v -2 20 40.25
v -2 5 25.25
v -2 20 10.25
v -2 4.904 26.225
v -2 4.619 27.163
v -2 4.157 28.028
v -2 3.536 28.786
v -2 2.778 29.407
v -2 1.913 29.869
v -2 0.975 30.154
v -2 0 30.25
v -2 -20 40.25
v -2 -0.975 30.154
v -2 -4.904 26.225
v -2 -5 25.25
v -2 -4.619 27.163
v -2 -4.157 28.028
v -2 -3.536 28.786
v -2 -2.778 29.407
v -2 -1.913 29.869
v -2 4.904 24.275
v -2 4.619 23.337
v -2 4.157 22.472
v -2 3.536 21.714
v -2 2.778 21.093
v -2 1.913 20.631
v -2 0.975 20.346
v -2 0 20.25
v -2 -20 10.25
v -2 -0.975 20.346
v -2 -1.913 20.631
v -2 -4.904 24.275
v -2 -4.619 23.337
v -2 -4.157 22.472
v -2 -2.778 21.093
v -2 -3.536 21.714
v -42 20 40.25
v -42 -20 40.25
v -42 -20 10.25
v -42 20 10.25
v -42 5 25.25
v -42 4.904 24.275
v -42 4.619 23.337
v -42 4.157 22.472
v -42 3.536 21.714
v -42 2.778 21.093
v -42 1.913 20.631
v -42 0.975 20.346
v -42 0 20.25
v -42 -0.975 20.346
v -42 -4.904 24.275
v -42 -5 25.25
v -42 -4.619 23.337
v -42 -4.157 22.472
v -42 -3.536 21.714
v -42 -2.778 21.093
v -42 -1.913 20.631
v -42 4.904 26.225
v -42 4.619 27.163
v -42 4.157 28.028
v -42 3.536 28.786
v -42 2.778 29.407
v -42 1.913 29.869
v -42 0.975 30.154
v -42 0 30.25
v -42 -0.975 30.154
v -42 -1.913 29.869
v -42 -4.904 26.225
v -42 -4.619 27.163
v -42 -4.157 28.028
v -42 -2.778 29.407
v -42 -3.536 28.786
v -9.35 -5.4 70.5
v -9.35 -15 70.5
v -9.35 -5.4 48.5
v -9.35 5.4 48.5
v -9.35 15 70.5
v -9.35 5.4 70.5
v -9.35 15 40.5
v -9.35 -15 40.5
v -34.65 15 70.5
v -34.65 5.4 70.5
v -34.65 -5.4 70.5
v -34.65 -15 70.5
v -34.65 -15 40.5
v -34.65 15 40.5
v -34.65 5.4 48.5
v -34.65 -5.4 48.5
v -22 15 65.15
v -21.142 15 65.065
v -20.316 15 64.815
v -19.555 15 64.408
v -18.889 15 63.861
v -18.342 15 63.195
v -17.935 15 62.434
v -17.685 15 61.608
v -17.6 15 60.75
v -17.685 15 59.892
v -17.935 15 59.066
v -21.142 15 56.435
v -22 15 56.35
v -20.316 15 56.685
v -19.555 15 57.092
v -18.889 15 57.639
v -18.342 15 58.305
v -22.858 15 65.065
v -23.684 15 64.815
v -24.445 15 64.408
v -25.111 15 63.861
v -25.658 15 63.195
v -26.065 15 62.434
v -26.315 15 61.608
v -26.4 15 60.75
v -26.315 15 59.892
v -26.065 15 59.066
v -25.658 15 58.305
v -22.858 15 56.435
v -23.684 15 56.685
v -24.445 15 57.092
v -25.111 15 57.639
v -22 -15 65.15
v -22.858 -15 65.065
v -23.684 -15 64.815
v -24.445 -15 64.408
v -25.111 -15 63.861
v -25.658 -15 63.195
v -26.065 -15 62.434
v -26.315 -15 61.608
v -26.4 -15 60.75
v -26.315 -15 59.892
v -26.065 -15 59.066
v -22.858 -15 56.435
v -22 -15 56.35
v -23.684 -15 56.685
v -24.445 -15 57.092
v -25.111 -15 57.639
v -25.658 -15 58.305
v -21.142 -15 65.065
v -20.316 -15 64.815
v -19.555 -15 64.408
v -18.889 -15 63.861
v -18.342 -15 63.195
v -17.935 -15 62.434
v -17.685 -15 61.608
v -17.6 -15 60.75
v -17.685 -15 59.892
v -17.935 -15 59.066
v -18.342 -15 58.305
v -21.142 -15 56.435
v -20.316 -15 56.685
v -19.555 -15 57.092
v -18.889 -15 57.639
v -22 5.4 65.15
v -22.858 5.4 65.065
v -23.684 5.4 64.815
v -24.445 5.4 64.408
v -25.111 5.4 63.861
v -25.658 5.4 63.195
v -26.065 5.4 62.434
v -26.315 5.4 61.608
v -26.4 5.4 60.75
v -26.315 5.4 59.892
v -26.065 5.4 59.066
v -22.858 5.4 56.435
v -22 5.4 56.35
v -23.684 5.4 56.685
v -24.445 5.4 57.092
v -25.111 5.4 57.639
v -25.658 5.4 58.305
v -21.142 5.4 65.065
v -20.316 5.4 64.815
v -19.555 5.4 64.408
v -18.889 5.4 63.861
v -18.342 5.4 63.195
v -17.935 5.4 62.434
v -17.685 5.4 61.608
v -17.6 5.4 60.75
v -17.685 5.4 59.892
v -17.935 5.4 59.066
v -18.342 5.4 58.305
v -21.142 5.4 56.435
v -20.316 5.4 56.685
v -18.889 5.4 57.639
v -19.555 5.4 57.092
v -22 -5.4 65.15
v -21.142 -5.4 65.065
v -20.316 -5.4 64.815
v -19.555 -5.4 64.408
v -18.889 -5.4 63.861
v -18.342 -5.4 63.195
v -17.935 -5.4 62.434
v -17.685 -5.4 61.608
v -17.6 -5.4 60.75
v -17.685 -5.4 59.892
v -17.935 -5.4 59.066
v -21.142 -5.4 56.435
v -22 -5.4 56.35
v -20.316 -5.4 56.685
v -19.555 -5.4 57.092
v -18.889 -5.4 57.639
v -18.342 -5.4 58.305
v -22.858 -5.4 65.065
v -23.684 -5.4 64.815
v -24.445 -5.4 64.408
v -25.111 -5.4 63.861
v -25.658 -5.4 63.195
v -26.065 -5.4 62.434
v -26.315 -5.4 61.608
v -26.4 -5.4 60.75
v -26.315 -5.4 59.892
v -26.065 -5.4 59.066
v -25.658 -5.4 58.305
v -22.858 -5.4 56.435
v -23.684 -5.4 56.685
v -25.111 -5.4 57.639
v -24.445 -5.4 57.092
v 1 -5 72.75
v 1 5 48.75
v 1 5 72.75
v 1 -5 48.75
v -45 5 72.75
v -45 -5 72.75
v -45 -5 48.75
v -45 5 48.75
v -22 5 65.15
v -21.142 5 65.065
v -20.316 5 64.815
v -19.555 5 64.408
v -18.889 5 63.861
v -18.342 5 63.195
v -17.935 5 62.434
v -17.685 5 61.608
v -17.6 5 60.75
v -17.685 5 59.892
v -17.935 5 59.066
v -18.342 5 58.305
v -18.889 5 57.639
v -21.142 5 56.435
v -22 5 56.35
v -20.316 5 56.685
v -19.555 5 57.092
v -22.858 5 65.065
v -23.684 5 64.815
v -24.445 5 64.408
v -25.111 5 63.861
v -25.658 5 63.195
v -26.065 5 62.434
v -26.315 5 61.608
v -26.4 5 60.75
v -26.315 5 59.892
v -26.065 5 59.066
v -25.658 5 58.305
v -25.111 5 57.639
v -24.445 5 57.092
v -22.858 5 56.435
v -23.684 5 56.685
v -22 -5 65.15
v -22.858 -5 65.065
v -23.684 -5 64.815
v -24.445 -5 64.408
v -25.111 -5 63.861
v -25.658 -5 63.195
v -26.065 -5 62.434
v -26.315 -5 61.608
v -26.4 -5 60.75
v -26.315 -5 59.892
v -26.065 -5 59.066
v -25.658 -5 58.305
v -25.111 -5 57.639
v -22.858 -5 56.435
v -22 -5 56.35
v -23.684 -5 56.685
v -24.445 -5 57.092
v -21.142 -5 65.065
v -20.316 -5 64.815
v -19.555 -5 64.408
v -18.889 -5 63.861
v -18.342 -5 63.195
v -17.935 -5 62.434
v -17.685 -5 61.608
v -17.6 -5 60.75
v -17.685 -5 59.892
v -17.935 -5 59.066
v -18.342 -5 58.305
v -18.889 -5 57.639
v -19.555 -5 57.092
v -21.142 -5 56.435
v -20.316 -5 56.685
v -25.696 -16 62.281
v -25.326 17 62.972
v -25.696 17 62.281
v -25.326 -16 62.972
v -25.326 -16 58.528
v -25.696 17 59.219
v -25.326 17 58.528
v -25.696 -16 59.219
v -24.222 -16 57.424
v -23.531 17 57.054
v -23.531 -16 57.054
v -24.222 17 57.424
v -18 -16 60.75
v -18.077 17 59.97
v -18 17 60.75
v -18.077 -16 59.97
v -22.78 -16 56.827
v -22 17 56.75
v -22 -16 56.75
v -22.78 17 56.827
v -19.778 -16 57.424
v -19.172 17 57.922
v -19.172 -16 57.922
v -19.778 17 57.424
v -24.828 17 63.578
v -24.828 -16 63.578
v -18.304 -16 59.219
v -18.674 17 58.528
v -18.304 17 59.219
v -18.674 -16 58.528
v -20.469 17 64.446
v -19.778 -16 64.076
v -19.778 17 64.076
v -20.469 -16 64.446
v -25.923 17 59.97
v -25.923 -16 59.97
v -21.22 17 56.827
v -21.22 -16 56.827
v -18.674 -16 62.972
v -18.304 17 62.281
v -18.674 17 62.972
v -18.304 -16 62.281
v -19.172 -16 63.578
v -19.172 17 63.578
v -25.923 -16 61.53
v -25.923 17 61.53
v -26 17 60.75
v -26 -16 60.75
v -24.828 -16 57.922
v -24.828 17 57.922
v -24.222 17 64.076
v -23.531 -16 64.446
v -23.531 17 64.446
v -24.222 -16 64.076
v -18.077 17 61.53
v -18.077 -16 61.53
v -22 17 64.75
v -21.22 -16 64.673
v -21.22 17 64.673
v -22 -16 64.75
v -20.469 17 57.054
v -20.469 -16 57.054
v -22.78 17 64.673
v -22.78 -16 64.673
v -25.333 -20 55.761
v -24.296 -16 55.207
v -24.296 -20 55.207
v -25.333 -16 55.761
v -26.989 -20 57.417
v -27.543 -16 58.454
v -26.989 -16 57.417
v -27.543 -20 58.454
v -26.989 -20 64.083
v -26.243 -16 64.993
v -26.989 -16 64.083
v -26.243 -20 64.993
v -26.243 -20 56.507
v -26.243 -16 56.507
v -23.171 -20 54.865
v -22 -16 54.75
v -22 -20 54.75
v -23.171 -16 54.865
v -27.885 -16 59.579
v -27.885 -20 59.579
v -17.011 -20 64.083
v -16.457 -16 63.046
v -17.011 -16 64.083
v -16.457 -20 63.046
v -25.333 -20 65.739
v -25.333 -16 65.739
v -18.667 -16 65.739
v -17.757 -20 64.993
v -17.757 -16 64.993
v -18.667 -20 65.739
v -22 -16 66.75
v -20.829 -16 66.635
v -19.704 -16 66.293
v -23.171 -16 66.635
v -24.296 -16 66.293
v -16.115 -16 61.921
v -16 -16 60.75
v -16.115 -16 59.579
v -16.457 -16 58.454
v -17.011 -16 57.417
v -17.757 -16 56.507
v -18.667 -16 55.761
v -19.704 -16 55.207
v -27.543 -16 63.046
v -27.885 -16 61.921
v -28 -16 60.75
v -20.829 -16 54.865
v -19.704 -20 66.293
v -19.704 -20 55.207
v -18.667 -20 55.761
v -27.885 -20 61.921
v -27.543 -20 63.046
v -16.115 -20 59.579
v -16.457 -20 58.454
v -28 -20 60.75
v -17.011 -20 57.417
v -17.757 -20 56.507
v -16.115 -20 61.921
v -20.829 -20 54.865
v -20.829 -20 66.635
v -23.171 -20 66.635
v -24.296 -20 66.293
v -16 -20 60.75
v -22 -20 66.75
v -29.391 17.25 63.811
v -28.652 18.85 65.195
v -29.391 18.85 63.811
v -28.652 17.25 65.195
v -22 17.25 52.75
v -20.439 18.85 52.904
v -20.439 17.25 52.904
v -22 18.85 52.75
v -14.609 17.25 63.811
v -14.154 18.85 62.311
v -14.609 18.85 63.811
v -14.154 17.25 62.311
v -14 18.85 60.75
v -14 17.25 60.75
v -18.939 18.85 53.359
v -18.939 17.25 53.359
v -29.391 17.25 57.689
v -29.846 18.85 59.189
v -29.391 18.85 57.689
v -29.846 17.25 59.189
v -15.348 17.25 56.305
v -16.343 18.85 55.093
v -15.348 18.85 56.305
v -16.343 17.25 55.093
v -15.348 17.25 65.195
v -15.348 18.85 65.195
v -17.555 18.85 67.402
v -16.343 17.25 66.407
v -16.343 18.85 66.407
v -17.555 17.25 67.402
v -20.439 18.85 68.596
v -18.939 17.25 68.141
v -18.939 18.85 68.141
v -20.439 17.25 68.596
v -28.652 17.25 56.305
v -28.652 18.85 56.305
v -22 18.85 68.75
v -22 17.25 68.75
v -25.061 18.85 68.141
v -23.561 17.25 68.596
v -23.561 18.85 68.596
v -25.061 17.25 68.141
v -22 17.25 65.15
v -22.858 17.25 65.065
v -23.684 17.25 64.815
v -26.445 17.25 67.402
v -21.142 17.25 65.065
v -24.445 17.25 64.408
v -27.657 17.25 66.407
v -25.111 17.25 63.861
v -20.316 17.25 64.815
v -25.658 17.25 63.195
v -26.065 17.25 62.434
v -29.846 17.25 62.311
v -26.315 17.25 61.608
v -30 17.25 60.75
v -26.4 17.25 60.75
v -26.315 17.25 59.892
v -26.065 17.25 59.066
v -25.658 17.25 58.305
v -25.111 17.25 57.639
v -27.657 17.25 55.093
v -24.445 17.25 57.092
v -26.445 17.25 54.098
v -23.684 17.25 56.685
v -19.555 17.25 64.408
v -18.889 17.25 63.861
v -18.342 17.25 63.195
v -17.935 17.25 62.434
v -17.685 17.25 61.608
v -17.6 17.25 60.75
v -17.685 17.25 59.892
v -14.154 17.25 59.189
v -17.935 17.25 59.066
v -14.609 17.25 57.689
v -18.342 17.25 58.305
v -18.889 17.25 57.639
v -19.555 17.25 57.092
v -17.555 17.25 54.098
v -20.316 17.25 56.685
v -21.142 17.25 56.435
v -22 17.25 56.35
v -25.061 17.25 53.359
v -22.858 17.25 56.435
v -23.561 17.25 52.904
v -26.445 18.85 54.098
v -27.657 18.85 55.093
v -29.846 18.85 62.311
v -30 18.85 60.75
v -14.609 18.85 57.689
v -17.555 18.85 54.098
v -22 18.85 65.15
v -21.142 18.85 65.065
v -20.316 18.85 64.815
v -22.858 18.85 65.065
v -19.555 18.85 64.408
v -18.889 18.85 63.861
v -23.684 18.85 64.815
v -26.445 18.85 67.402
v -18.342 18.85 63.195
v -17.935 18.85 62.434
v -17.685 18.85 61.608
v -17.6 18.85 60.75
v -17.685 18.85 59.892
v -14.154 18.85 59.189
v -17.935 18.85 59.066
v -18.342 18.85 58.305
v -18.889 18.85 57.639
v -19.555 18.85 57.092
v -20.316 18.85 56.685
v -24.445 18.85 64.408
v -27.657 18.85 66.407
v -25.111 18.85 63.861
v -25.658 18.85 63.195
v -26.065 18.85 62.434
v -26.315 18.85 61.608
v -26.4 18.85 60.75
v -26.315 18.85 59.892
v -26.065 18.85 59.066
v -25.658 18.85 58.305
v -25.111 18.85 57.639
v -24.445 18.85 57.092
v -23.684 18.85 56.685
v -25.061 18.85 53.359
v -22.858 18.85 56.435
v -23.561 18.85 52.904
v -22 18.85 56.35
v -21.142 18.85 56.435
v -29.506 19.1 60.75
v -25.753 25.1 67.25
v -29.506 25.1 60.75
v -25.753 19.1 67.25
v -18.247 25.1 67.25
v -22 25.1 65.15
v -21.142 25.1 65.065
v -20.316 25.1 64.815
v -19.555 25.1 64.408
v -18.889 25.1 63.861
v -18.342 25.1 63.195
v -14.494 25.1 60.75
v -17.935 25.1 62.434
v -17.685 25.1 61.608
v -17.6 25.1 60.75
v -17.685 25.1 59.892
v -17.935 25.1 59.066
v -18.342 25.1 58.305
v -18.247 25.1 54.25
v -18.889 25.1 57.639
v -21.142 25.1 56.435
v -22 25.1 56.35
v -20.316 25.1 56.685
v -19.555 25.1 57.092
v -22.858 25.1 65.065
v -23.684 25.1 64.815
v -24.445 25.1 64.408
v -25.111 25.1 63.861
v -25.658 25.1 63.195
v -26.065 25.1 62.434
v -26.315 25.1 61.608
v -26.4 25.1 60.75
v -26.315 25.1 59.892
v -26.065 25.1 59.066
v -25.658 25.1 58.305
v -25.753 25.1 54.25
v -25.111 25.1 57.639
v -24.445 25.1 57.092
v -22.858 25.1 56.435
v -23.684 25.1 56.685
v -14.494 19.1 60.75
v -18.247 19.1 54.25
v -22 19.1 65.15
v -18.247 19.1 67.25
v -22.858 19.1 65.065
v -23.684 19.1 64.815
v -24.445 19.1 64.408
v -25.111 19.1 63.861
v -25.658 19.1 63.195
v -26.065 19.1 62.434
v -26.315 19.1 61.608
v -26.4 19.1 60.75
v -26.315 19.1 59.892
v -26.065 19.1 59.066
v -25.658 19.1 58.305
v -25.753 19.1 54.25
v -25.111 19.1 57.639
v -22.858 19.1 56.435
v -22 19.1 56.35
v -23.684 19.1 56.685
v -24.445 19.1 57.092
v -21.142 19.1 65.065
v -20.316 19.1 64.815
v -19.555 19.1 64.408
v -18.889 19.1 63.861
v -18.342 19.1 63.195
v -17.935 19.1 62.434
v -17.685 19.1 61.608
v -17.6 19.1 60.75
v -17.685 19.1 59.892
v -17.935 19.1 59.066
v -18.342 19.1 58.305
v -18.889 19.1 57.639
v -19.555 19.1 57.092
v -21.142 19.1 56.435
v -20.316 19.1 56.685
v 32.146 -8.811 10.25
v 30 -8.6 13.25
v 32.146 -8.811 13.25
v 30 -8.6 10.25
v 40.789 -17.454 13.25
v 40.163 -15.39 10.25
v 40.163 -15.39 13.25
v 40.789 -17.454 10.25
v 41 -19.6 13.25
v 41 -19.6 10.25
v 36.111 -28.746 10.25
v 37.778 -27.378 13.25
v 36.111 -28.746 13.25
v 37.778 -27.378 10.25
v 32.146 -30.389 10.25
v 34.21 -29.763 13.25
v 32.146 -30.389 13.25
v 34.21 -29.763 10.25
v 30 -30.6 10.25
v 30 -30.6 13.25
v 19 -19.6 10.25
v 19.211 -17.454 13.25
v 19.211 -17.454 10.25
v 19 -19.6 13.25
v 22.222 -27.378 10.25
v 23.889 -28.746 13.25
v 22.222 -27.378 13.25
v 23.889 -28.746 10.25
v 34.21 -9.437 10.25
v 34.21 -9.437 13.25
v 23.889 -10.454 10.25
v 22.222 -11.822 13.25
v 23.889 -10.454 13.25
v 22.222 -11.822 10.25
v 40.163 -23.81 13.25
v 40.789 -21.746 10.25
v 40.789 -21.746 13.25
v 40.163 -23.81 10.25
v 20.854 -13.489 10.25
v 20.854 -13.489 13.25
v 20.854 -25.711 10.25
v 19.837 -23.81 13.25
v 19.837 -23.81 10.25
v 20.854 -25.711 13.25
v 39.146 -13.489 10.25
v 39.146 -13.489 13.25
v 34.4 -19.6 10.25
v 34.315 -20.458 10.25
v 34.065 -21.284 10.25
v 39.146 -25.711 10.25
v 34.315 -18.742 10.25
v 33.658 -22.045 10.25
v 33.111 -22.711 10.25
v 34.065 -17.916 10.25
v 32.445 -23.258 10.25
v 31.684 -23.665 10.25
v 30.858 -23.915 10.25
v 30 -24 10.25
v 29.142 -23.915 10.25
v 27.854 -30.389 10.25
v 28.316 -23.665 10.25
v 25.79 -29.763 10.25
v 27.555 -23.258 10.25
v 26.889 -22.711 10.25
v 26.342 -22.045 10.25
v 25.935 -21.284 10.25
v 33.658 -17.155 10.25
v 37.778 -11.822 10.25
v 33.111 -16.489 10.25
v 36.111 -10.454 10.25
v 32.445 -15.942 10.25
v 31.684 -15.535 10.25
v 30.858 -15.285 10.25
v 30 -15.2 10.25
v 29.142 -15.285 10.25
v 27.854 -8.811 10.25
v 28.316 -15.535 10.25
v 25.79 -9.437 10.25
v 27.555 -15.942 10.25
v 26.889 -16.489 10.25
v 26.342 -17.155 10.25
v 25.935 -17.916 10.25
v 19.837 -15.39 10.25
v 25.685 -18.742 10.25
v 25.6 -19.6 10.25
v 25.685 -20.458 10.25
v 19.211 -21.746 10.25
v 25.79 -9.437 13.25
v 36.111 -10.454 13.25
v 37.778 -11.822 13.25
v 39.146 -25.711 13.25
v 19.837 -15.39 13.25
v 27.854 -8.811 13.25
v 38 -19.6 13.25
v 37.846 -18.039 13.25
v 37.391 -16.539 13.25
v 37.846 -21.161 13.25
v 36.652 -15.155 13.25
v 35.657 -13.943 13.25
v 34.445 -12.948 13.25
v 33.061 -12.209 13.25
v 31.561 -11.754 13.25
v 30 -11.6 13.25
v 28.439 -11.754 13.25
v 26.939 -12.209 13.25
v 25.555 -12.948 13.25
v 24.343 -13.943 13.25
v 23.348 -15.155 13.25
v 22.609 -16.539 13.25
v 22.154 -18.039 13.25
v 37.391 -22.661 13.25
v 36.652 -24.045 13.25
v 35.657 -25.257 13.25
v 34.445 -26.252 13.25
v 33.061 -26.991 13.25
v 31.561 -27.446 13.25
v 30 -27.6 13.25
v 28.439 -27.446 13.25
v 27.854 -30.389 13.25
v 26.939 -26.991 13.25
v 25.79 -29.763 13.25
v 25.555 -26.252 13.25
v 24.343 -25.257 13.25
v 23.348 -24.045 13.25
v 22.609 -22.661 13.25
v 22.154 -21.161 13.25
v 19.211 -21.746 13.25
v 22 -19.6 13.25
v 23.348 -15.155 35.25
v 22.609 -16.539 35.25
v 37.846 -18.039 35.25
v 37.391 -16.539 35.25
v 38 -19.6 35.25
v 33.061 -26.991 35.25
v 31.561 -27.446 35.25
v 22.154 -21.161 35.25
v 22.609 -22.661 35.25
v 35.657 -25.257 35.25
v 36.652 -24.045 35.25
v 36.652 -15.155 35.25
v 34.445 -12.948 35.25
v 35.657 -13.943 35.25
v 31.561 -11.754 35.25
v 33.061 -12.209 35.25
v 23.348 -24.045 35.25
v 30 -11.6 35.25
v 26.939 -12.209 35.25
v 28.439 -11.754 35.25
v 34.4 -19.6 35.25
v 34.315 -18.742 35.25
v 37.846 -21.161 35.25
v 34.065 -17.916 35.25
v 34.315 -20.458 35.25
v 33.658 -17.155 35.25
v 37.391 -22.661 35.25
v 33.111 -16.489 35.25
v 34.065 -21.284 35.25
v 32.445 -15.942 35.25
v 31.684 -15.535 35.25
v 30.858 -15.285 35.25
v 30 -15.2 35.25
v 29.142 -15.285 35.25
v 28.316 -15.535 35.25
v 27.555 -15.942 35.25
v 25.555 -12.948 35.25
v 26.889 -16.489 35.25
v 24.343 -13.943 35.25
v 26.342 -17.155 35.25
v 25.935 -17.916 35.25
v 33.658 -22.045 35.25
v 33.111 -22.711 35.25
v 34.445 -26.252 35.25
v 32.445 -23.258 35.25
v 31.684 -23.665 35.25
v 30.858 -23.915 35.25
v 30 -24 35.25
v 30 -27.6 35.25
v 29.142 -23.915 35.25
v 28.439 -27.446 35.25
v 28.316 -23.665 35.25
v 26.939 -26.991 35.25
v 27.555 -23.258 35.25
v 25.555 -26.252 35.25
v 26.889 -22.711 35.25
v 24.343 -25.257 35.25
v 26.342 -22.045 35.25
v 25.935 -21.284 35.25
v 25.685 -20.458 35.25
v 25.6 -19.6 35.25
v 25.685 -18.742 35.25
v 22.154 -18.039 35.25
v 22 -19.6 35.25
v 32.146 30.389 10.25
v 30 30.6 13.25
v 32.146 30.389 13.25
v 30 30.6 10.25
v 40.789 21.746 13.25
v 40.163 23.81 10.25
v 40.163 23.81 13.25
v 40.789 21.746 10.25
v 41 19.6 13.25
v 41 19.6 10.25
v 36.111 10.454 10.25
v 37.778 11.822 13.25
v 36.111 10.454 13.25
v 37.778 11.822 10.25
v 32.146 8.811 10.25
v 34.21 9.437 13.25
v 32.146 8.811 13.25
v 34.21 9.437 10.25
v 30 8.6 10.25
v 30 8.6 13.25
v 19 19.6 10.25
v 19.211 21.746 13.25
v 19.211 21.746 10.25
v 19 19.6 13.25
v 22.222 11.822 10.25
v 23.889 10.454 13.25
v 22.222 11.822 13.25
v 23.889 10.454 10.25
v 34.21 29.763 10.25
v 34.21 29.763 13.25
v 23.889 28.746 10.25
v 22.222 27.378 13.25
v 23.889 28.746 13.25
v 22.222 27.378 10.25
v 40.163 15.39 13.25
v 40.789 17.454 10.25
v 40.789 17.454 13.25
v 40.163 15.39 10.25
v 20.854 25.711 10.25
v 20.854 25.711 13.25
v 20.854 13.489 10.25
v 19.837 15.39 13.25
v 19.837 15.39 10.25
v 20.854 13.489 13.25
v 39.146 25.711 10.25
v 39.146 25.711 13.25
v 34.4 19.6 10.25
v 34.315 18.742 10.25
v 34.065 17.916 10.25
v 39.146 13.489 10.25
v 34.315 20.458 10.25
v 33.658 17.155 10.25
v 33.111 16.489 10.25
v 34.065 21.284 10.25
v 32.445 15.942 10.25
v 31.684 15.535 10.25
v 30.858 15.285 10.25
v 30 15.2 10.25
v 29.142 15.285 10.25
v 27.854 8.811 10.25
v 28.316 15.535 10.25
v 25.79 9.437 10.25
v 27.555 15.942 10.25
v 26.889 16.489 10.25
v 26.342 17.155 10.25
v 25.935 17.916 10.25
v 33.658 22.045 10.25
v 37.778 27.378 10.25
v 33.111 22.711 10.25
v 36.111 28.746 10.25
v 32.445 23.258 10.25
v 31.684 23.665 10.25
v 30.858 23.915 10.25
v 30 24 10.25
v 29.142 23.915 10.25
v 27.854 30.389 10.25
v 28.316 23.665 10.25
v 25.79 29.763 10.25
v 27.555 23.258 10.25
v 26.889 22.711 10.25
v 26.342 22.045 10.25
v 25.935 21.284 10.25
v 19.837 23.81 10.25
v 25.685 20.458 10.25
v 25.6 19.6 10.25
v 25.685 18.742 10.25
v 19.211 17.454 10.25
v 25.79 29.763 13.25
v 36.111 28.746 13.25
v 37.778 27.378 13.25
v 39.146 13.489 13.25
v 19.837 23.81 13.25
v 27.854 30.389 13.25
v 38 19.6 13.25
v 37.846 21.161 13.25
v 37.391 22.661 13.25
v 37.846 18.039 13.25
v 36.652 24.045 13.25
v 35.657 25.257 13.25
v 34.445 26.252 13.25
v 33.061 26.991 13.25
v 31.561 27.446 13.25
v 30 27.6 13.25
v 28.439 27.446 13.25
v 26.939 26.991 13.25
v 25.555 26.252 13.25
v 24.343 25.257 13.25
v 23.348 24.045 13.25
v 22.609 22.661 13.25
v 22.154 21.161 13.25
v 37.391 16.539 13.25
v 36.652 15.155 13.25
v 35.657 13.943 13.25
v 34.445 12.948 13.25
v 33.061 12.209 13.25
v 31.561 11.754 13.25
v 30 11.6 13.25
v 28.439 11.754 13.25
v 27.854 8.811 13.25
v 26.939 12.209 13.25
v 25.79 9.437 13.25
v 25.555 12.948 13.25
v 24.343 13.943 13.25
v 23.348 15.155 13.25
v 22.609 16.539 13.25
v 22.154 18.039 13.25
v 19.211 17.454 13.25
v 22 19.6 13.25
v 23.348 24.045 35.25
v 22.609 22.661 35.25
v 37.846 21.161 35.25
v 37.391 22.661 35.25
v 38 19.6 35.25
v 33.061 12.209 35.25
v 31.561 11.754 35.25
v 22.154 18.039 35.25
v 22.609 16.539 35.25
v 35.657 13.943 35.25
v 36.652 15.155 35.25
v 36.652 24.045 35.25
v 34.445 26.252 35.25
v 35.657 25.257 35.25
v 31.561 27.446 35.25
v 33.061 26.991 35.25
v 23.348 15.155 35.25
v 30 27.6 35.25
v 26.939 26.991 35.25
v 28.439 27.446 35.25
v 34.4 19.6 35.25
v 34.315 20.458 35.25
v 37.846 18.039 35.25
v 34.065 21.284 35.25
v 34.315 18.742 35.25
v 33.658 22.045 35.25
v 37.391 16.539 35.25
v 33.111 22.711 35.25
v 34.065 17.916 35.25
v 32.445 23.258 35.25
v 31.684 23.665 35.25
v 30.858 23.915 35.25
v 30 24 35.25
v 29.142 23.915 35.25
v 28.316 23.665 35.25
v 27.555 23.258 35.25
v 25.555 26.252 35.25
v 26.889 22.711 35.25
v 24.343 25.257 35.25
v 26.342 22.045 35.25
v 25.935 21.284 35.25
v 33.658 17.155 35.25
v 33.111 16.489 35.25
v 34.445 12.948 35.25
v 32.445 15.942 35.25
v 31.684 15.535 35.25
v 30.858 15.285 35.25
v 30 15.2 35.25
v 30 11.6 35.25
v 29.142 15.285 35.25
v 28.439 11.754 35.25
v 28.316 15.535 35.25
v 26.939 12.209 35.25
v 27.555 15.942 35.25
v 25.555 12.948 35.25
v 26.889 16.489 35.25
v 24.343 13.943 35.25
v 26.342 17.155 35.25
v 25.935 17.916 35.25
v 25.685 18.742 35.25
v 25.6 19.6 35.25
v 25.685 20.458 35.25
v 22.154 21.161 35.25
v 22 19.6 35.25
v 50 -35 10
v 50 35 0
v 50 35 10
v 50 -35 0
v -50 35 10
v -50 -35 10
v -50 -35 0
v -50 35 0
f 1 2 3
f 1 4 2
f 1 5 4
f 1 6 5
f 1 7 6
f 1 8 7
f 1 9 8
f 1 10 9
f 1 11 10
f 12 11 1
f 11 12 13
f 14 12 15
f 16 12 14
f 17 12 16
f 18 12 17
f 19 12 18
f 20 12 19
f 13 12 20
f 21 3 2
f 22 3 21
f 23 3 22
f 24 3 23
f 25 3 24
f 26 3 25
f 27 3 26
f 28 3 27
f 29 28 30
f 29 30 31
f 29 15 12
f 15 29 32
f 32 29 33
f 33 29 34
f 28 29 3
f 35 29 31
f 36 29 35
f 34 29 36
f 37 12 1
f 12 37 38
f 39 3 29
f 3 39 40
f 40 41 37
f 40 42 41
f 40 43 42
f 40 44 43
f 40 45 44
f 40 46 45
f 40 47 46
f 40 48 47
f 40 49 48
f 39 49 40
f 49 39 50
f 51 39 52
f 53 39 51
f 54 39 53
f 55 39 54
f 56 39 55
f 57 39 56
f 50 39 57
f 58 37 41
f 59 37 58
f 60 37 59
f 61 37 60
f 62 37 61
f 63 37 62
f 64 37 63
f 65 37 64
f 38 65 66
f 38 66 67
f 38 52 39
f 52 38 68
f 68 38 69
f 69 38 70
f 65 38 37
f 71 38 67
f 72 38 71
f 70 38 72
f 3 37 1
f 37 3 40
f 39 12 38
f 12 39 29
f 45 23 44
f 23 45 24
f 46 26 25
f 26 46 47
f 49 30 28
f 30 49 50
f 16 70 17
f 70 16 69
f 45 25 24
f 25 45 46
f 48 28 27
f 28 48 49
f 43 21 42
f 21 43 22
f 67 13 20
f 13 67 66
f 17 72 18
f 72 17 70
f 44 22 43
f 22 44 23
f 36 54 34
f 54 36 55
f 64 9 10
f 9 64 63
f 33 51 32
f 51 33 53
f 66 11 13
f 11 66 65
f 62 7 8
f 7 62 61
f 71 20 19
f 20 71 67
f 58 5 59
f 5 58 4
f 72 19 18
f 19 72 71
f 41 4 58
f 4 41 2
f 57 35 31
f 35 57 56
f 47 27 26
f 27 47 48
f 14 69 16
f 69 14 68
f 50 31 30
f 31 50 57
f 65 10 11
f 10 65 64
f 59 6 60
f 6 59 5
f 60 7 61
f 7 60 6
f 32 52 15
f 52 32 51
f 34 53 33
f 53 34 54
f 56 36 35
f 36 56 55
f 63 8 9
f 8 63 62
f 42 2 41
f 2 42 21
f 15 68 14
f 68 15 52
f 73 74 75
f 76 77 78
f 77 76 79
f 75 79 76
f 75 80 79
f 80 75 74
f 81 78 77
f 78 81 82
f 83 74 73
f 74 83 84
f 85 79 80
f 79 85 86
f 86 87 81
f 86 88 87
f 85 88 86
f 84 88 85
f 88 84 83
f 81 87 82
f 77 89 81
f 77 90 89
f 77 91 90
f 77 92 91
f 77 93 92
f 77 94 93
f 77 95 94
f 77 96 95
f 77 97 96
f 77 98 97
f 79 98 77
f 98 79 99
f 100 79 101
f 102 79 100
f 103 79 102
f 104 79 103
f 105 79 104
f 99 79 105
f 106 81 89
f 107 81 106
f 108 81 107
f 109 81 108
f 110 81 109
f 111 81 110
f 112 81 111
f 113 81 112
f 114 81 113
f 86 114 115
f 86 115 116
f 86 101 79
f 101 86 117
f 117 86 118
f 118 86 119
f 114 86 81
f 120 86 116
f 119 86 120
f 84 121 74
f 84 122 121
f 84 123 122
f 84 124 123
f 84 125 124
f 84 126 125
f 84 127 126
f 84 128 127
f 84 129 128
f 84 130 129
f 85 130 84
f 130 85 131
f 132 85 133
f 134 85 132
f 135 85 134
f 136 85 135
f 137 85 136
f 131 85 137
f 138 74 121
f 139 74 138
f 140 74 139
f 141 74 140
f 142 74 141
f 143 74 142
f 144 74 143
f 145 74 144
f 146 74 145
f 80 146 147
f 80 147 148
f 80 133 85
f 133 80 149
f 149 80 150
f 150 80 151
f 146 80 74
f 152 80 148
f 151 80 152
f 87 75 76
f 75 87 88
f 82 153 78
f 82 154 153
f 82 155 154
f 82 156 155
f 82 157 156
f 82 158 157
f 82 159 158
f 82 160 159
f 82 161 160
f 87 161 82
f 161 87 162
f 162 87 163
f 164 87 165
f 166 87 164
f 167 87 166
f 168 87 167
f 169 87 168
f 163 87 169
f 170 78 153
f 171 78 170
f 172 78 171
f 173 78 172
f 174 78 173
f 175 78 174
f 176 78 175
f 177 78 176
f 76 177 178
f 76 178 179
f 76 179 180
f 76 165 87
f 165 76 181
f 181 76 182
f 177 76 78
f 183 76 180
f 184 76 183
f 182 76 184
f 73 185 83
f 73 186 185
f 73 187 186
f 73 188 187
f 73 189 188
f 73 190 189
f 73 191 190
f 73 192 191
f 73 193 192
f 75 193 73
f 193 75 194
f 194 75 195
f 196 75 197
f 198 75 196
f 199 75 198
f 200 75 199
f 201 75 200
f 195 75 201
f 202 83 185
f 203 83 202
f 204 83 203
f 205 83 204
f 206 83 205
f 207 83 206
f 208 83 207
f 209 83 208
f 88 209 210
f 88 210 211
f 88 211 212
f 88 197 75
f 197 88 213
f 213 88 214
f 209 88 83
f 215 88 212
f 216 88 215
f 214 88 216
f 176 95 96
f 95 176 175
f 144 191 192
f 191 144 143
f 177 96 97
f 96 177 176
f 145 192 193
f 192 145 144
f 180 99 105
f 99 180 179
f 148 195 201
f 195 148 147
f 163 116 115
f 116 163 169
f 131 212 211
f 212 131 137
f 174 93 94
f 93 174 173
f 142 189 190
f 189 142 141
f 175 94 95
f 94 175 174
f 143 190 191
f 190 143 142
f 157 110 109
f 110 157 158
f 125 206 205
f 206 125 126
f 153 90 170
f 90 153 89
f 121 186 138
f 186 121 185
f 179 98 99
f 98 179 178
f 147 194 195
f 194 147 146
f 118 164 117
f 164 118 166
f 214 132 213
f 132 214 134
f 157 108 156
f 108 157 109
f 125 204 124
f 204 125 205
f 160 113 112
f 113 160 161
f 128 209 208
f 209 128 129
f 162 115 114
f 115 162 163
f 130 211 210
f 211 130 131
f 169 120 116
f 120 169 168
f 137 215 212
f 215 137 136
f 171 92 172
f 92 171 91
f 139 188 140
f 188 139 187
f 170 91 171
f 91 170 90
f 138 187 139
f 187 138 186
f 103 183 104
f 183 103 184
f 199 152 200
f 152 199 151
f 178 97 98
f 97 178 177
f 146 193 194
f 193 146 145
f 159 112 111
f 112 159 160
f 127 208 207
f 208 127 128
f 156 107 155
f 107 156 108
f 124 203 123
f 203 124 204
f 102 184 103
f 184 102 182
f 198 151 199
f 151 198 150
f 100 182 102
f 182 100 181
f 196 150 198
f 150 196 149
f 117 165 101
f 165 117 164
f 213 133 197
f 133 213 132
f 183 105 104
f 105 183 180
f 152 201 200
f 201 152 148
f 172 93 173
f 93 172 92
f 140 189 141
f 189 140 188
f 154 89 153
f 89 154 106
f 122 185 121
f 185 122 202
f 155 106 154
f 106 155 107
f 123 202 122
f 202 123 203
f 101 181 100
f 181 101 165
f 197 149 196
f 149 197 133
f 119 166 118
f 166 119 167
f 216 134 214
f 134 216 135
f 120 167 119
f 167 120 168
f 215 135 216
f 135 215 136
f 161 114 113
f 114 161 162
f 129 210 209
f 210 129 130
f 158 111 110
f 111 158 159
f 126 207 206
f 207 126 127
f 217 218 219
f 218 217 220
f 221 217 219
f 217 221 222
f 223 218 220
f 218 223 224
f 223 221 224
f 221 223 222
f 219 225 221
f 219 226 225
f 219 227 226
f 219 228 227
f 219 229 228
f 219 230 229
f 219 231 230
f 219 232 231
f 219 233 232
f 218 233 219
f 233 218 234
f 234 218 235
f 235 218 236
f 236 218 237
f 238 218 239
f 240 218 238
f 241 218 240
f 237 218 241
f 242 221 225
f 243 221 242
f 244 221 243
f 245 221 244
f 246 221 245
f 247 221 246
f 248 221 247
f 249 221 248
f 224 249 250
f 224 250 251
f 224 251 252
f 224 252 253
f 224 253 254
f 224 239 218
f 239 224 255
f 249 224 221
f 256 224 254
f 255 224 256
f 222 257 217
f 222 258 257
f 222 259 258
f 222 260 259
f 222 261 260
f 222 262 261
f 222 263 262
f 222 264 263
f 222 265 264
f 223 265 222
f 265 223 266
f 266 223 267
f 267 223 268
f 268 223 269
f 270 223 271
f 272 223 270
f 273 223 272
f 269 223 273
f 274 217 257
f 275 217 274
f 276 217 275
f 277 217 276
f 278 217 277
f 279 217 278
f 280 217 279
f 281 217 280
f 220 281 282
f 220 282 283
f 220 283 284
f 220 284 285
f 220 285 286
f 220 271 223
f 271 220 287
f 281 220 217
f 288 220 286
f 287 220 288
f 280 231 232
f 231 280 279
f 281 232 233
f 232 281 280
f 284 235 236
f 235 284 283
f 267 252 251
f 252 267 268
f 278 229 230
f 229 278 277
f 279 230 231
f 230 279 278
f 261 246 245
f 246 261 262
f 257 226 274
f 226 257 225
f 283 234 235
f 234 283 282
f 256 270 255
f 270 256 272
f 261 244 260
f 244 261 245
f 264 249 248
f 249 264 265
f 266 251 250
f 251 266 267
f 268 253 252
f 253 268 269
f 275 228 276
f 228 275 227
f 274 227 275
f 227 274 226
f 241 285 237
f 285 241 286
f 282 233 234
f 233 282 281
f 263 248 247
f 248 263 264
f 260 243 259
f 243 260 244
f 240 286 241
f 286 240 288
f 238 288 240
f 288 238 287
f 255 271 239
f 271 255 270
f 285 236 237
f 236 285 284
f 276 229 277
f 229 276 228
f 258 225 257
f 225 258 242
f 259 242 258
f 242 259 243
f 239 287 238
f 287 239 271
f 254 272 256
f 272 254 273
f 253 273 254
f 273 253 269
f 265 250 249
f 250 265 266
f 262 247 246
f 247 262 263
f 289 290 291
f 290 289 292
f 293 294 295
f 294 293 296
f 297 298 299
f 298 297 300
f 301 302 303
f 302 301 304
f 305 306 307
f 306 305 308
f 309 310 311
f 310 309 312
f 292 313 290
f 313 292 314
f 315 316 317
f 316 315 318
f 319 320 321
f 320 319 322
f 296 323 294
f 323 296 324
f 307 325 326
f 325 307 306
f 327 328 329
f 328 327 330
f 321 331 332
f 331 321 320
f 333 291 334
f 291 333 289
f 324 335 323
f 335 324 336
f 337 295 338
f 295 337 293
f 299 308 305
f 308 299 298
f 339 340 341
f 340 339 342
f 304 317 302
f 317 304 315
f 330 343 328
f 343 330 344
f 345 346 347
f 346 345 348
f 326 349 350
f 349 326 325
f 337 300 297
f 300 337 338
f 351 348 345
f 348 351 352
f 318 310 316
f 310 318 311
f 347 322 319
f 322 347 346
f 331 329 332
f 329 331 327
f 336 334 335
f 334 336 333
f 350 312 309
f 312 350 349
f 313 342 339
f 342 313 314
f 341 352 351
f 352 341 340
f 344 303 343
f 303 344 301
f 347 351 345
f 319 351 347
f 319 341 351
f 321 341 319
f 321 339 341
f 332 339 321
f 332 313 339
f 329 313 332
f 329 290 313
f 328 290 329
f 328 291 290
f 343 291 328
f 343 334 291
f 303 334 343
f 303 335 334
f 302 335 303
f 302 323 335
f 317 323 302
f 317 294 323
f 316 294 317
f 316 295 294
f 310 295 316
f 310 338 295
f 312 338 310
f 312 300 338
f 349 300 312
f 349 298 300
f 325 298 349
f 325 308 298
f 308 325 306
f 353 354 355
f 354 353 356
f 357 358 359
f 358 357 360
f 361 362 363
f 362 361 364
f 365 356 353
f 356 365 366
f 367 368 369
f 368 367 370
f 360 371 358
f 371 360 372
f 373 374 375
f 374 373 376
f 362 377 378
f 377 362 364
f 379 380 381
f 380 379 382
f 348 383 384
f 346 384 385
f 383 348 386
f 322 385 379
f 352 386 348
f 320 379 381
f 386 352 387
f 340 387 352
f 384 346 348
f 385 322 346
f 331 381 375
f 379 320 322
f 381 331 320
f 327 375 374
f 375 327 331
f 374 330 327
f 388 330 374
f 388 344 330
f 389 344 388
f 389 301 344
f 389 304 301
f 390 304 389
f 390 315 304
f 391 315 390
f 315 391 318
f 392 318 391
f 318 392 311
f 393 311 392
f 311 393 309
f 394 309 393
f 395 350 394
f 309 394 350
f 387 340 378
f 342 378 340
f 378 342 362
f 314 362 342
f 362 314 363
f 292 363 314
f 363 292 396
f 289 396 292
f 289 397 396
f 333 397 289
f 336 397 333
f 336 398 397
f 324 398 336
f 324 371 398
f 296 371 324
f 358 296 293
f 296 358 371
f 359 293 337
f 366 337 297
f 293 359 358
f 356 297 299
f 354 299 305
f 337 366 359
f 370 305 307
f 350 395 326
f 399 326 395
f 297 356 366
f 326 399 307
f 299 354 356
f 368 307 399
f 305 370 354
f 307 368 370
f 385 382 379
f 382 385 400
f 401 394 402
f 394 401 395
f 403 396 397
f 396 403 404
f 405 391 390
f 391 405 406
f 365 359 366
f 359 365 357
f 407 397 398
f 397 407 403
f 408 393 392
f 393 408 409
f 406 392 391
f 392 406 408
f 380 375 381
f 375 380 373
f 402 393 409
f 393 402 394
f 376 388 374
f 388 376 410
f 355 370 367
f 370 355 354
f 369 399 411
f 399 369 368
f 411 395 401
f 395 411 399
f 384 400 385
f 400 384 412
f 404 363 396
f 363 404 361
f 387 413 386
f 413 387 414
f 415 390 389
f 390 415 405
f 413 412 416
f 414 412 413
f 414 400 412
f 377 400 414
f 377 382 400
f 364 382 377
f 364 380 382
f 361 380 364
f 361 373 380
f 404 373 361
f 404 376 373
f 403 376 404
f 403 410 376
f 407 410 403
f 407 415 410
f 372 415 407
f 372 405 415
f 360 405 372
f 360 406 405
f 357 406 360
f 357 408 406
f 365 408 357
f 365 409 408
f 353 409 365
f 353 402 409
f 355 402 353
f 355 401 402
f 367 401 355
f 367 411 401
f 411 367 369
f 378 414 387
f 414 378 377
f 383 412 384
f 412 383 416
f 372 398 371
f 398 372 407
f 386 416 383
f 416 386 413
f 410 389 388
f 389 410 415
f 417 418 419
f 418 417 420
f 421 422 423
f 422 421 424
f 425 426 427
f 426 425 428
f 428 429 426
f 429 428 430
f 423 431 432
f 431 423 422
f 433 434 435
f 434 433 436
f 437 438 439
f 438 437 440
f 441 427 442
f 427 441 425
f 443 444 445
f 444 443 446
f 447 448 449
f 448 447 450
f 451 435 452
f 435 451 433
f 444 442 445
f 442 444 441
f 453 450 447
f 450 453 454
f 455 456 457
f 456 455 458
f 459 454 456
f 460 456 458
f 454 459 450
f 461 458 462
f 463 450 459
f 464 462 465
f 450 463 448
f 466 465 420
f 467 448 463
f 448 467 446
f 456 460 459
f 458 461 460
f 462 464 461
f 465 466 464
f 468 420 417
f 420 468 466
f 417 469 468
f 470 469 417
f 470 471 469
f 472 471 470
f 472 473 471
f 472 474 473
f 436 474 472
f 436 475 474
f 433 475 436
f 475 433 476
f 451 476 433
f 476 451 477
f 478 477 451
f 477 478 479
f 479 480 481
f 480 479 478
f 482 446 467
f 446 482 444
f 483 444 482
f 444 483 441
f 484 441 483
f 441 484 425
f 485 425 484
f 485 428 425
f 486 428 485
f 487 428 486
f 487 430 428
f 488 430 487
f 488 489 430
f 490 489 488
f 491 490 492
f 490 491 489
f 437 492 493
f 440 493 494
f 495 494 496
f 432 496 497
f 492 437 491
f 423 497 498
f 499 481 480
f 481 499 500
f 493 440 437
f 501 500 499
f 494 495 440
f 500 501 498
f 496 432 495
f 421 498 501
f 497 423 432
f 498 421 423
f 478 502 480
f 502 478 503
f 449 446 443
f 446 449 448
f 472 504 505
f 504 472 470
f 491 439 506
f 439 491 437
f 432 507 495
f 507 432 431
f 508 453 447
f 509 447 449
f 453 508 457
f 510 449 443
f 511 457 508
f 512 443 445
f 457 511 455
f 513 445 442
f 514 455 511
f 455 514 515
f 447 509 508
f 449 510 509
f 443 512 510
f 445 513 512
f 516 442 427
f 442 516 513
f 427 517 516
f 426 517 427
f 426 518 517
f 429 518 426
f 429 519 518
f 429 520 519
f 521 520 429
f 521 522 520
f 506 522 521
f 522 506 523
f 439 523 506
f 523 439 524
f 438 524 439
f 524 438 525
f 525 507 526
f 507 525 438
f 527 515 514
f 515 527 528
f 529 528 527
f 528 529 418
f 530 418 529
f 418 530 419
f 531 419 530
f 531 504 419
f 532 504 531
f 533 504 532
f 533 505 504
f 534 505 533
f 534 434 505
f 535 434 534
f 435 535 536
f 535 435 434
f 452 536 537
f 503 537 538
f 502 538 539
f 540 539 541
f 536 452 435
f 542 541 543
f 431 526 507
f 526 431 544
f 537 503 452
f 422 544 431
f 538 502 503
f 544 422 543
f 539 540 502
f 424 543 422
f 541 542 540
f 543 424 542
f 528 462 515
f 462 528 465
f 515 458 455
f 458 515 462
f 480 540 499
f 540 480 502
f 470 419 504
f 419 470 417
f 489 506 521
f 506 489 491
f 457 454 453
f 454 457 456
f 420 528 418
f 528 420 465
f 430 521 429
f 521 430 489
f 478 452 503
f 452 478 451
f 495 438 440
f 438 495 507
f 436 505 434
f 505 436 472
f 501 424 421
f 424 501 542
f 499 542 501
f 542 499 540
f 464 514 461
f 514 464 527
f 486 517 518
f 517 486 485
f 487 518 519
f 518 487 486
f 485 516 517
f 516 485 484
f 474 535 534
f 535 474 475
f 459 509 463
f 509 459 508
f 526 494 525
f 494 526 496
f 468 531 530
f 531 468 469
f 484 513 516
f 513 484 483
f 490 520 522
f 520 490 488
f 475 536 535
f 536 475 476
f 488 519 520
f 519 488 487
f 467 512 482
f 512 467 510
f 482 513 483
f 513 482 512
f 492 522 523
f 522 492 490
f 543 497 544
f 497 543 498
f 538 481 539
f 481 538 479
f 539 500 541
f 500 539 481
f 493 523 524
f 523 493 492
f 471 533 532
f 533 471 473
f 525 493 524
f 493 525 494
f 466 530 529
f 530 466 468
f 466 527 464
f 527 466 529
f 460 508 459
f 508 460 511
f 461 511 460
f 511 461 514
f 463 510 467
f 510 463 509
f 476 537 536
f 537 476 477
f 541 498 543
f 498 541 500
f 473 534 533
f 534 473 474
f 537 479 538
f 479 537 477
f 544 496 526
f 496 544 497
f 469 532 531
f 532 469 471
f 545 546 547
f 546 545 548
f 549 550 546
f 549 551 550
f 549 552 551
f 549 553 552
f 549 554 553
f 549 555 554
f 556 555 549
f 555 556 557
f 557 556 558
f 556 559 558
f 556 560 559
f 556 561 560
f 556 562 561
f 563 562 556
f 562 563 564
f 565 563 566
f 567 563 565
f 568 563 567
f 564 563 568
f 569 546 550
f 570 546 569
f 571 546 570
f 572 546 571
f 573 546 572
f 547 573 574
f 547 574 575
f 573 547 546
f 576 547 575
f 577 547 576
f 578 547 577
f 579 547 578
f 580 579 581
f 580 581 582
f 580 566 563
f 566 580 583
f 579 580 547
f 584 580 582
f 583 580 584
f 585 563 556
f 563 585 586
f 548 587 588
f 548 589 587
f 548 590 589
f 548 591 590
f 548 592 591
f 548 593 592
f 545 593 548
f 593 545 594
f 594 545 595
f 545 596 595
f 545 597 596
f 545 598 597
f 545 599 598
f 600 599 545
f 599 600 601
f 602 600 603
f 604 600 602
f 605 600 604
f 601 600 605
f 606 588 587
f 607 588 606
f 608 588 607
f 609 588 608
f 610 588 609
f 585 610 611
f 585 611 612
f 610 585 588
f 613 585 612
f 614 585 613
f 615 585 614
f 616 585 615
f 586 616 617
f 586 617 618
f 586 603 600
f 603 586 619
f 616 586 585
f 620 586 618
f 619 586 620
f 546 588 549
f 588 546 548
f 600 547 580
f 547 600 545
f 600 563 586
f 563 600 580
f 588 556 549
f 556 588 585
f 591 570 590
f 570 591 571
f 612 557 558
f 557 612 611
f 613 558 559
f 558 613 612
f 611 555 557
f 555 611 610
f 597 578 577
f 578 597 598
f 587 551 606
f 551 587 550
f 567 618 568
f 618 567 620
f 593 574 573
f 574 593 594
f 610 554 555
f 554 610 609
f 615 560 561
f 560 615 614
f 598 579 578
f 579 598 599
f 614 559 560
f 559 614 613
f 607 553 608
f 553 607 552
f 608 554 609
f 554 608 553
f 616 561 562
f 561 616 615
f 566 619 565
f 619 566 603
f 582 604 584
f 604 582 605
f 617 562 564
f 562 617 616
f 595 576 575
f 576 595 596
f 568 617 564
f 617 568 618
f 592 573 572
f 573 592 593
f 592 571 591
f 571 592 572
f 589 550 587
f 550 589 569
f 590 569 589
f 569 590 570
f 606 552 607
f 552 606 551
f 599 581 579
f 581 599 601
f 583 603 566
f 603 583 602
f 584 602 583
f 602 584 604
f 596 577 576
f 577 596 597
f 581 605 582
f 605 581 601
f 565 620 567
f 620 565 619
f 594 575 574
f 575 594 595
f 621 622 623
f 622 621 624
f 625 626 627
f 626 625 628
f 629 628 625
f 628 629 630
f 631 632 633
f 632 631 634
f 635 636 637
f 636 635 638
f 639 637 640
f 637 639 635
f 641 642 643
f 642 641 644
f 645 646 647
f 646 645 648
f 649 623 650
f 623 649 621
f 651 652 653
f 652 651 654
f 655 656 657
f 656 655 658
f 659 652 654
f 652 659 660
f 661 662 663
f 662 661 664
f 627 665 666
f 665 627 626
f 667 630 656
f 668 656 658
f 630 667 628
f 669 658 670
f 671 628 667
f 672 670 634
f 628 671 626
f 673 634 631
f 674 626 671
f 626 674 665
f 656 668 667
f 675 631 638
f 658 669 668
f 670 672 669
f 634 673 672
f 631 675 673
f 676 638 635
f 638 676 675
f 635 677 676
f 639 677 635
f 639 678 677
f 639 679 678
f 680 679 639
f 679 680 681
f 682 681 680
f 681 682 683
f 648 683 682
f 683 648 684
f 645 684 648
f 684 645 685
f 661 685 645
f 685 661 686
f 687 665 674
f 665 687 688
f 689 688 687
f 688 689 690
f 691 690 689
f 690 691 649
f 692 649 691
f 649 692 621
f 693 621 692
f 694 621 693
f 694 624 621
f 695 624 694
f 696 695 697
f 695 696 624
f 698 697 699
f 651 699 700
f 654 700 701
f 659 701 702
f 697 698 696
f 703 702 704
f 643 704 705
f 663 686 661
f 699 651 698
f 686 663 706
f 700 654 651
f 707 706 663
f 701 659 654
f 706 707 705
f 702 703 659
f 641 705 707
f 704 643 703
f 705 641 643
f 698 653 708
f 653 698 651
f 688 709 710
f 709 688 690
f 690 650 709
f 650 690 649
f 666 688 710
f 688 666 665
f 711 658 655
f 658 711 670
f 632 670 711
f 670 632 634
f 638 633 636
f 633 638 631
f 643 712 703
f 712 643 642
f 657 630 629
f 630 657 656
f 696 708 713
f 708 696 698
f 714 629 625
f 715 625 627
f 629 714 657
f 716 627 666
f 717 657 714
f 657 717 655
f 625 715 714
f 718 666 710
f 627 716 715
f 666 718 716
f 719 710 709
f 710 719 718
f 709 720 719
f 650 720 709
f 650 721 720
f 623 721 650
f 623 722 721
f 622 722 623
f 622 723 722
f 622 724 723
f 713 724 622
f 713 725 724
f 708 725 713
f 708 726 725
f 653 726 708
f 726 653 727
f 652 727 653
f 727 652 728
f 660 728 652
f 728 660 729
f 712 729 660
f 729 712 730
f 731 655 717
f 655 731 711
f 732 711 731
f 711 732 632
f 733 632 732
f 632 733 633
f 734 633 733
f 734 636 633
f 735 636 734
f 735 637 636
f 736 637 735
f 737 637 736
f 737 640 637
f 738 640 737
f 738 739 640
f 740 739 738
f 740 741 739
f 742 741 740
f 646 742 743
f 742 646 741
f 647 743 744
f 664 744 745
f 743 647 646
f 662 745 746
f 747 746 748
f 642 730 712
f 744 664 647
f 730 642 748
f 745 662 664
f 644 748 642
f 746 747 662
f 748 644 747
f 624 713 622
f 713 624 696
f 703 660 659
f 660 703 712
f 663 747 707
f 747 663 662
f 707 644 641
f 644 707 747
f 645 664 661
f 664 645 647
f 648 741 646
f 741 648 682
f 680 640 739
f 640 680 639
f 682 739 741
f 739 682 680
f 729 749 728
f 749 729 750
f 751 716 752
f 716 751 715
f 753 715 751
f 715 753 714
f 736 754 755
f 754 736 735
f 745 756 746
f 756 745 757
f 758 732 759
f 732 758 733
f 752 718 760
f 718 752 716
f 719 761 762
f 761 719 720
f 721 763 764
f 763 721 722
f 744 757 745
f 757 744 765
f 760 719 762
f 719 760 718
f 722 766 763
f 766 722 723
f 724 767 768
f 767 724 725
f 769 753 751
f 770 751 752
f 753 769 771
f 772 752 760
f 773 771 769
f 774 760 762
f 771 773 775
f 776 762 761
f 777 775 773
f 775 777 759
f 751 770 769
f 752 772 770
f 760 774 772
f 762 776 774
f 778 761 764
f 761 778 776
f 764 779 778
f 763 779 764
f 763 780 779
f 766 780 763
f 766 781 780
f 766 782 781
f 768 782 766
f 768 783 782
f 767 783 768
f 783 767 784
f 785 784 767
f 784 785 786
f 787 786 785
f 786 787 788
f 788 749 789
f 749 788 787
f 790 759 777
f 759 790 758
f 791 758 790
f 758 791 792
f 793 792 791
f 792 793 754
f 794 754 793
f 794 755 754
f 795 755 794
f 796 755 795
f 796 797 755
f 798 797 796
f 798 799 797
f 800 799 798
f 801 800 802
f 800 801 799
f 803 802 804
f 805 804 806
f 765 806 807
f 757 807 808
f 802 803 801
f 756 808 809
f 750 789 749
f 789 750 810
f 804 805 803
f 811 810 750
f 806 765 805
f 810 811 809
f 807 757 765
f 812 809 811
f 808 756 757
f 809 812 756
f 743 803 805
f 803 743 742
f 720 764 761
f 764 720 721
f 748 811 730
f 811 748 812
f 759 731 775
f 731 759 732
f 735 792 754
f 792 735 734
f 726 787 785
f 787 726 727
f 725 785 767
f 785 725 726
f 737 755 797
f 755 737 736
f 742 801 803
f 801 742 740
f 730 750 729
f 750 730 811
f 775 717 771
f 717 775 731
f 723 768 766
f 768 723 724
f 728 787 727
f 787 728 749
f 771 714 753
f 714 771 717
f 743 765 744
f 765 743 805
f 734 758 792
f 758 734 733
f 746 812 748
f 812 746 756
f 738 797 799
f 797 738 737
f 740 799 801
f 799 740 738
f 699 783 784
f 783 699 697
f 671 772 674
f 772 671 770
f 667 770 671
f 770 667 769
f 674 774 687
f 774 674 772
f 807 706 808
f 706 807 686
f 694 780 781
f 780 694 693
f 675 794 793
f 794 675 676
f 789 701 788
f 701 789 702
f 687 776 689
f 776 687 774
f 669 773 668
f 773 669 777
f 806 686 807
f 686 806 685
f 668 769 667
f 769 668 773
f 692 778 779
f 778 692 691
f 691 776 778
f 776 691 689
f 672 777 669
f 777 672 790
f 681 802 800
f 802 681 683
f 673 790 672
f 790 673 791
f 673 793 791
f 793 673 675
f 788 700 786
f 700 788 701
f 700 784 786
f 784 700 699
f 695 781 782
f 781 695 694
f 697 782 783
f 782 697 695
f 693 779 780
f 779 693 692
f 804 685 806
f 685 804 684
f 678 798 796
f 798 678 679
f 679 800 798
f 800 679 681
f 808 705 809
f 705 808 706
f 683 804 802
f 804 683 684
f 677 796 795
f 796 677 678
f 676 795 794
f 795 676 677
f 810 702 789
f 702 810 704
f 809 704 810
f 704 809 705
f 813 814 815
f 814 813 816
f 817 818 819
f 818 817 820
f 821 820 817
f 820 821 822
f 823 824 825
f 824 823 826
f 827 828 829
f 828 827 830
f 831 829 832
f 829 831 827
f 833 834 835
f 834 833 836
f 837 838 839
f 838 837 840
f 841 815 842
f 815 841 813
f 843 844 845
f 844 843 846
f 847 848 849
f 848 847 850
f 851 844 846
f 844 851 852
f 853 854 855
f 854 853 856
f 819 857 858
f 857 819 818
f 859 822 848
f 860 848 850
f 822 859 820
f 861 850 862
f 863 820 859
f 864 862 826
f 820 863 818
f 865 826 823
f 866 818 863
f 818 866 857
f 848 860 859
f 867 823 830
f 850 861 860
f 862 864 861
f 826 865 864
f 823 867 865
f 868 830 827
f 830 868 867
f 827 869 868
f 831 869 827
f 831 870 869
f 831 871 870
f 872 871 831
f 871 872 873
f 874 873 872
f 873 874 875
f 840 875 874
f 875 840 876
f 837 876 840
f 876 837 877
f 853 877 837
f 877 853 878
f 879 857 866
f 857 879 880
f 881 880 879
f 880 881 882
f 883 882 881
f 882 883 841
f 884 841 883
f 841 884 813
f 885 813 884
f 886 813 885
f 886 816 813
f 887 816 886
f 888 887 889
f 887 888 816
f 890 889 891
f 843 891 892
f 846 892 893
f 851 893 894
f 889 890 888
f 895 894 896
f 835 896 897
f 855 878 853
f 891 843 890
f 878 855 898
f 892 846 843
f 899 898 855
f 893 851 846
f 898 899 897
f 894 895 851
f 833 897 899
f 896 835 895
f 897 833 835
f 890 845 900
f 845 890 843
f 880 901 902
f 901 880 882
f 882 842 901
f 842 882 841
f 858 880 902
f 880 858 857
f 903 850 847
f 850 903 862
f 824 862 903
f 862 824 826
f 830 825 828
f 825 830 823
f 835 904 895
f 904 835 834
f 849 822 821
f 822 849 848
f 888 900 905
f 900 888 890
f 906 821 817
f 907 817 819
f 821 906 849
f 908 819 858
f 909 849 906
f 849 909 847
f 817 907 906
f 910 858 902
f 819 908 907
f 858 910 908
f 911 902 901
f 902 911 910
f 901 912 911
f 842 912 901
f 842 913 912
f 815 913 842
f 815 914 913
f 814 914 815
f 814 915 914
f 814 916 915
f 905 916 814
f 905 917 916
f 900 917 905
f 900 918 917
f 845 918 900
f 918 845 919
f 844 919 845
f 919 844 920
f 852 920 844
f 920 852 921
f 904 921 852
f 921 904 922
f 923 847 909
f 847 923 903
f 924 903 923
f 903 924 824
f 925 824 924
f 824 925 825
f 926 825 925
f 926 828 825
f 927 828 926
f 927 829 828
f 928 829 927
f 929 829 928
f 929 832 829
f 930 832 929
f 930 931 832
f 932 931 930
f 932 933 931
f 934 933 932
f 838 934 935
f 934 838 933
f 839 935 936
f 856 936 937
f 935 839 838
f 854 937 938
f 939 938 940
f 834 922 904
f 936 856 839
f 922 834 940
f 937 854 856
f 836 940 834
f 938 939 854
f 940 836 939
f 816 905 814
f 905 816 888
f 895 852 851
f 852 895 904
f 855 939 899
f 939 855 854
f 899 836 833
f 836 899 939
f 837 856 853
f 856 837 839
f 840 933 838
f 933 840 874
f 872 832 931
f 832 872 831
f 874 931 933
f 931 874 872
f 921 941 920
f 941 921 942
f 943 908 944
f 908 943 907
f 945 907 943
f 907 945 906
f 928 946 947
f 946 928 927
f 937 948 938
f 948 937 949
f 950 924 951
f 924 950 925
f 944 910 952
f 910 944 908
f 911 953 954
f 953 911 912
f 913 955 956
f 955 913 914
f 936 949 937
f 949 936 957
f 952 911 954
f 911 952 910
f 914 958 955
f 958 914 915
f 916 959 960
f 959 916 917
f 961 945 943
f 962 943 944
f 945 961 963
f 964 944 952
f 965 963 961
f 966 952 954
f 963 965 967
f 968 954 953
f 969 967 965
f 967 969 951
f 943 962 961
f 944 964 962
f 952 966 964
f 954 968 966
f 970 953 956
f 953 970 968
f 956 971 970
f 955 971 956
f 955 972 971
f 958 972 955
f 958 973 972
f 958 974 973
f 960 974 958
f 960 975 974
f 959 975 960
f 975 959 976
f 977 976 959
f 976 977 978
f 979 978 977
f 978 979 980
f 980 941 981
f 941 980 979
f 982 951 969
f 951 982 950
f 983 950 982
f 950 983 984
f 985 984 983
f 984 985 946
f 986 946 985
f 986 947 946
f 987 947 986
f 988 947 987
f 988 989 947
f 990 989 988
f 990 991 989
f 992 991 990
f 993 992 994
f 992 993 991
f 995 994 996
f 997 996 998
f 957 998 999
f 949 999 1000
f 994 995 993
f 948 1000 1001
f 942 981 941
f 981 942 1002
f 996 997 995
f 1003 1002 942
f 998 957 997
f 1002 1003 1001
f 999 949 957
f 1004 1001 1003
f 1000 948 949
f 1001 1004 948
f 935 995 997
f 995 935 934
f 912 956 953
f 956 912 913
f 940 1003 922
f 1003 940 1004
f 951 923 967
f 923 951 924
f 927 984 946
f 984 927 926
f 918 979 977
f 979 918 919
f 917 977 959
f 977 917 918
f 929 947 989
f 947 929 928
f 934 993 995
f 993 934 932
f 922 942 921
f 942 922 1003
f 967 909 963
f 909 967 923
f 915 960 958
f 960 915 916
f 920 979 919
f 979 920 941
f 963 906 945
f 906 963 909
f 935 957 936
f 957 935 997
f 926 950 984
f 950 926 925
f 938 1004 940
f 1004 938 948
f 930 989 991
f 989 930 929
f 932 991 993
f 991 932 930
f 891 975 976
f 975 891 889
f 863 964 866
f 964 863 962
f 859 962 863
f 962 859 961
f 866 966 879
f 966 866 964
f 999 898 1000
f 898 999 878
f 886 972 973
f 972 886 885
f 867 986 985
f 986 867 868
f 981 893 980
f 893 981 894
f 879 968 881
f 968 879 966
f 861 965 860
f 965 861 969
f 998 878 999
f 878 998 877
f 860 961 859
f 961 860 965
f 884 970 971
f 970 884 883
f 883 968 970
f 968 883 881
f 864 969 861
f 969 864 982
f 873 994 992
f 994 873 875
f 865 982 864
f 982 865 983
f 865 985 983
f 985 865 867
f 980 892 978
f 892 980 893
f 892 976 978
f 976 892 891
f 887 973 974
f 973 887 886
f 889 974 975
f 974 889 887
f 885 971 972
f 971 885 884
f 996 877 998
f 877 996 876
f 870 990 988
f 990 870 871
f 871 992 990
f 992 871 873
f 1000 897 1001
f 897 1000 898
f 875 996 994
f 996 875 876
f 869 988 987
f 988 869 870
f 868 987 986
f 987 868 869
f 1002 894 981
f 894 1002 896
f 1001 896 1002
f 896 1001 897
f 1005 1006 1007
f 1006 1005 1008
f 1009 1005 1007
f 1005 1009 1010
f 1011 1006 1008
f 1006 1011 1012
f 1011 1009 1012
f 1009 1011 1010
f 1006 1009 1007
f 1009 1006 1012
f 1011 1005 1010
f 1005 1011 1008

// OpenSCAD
$fn = 32;

// ------------------------------------------------------------------------
// Indexing jig: plate 100 x 70 mm, pin d8
// Every part is its own module, assembly() places every instance.
// ------------------------------------------------------------------------

// --- part 1 ---
module jig_plate() {
  difference() {
    translate([-50, -35, 0]) cube([100, 70, 10]);
  }
}

// --- part 2 ---
module locator_block() {
  difference() {
    translate([-20, -20, 0]) cube([40, 40, 30]);
    translate([0, 0, 15]) rotate([0, 90, 0]) cylinder(h = 42, d = 10, center = true);
  }
}

// --- part 3 ---
module index_fork() {
  difference() {
    translate([-12.65, -15, 0]) cube([25.3, 30, 30]);
    translate([-13.65, -5.4, 8]) cube([27.3, 10.8, 23]);
    translate([0, 0, 20.25]) rotate([90, 0, 0]) cylinder(h = 32, d = 8.8, center = true);
  }
}

// --- part 4 ---
module index_arm() {
  difference() {
    translate([-23, -5, 0]) cube([46, 10, 24]);
    translate([0, 0, 12]) rotate([90, 0, 0]) cylinder(h = 12, d = 8.8, center = true);
  }
}

// --- part 5 ---
module index_pin() {
  rotate([0, 90, 0]) cylinder(h = 34, d = 8, center = true);
  translate([-20, 0, 0]) rotate([0, 90, 0]) cylinder(h = 4, d = 12);
}

// --- part 6 ---
module pin_washer() {
  difference() {
      translate([0, 0, 0]) cylinder(h = 1.6, d = 16);
      translate([0, 0, -1]) cylinder(h = 3.6, d = 8.8);
    }
}

// --- part 7 ---
module lock_nut() {
  difference() {
    linear_extrude(height = 6) polygon(points = [[7.506, 0], [3.753, 6.5], [-3.753, 6.5], [-7.506, 0], [-3.753, -6.5], [3.753, -6.5]]);
    translate([0, 0, -1]) cylinder(h = 8, d = 8.8);
  }
}

// --- part 8 ---
module guide_bush_a() {
  difference() {
    union() {
      cylinder(h = 3, d = 22);
      translate([0, 0, 3]) cylinder(h = 22, d = 16);
    }
    translate([0, 0, -1]) cylinder(h = 27, d = 8.8);
  }
}

// --- part 9 ---
module guide_bush_b() {
  difference() {
    union() {
      cylinder(h = 3, d = 22);
      translate([0, 0, 3]) cylinder(h = 22, d = 16);
    }
    translate([0, 0, -1]) cylinder(h = 27, d = 8.8);
  }
}

// --- assembly ---
module assembly() {
  color([0.80, 0.24, 0.20]) translate([0, 0, 0]) rotate([0, 0, 0]) jig_plate();
  color([0.20, 0.45, 0.75]) translate([-22, 0, 10.25]) rotate([0, 0, 0]) locator_block();
  color([0.25, 0.62, 0.32]) translate([-22, 0, 40.5]) rotate([0, 0, 0]) index_fork();
  color([0.92, 0.70, 0.18]) translate([-22, 0, 48.75]) rotate([0, 0, 0]) index_arm();
  color([0.58, 0.35, 0.70]) translate([-22, 0, 60.75]) rotate([0, 0, 90]) index_pin();
  color([0.16, 0.66, 0.66]) translate([-22, 18.85, 60.75]) rotate([90, 0, 0]) pin_washer();
  color([0.85, 0.48, 0.18]) translate([-22, 25.1, 60.75]) rotate([90, 0, 0]) lock_nut();
  color([0.55, 0.60, 0.65]) translate([30, -19.6, 10.25]) rotate([0, 0, 0]) guide_bush_a();
  color([0.75, 0.30, 0.55]) translate([30, 19.6, 10.25]) rotate([0, 0, 0]) guide_bush_b();
}

assembly();
